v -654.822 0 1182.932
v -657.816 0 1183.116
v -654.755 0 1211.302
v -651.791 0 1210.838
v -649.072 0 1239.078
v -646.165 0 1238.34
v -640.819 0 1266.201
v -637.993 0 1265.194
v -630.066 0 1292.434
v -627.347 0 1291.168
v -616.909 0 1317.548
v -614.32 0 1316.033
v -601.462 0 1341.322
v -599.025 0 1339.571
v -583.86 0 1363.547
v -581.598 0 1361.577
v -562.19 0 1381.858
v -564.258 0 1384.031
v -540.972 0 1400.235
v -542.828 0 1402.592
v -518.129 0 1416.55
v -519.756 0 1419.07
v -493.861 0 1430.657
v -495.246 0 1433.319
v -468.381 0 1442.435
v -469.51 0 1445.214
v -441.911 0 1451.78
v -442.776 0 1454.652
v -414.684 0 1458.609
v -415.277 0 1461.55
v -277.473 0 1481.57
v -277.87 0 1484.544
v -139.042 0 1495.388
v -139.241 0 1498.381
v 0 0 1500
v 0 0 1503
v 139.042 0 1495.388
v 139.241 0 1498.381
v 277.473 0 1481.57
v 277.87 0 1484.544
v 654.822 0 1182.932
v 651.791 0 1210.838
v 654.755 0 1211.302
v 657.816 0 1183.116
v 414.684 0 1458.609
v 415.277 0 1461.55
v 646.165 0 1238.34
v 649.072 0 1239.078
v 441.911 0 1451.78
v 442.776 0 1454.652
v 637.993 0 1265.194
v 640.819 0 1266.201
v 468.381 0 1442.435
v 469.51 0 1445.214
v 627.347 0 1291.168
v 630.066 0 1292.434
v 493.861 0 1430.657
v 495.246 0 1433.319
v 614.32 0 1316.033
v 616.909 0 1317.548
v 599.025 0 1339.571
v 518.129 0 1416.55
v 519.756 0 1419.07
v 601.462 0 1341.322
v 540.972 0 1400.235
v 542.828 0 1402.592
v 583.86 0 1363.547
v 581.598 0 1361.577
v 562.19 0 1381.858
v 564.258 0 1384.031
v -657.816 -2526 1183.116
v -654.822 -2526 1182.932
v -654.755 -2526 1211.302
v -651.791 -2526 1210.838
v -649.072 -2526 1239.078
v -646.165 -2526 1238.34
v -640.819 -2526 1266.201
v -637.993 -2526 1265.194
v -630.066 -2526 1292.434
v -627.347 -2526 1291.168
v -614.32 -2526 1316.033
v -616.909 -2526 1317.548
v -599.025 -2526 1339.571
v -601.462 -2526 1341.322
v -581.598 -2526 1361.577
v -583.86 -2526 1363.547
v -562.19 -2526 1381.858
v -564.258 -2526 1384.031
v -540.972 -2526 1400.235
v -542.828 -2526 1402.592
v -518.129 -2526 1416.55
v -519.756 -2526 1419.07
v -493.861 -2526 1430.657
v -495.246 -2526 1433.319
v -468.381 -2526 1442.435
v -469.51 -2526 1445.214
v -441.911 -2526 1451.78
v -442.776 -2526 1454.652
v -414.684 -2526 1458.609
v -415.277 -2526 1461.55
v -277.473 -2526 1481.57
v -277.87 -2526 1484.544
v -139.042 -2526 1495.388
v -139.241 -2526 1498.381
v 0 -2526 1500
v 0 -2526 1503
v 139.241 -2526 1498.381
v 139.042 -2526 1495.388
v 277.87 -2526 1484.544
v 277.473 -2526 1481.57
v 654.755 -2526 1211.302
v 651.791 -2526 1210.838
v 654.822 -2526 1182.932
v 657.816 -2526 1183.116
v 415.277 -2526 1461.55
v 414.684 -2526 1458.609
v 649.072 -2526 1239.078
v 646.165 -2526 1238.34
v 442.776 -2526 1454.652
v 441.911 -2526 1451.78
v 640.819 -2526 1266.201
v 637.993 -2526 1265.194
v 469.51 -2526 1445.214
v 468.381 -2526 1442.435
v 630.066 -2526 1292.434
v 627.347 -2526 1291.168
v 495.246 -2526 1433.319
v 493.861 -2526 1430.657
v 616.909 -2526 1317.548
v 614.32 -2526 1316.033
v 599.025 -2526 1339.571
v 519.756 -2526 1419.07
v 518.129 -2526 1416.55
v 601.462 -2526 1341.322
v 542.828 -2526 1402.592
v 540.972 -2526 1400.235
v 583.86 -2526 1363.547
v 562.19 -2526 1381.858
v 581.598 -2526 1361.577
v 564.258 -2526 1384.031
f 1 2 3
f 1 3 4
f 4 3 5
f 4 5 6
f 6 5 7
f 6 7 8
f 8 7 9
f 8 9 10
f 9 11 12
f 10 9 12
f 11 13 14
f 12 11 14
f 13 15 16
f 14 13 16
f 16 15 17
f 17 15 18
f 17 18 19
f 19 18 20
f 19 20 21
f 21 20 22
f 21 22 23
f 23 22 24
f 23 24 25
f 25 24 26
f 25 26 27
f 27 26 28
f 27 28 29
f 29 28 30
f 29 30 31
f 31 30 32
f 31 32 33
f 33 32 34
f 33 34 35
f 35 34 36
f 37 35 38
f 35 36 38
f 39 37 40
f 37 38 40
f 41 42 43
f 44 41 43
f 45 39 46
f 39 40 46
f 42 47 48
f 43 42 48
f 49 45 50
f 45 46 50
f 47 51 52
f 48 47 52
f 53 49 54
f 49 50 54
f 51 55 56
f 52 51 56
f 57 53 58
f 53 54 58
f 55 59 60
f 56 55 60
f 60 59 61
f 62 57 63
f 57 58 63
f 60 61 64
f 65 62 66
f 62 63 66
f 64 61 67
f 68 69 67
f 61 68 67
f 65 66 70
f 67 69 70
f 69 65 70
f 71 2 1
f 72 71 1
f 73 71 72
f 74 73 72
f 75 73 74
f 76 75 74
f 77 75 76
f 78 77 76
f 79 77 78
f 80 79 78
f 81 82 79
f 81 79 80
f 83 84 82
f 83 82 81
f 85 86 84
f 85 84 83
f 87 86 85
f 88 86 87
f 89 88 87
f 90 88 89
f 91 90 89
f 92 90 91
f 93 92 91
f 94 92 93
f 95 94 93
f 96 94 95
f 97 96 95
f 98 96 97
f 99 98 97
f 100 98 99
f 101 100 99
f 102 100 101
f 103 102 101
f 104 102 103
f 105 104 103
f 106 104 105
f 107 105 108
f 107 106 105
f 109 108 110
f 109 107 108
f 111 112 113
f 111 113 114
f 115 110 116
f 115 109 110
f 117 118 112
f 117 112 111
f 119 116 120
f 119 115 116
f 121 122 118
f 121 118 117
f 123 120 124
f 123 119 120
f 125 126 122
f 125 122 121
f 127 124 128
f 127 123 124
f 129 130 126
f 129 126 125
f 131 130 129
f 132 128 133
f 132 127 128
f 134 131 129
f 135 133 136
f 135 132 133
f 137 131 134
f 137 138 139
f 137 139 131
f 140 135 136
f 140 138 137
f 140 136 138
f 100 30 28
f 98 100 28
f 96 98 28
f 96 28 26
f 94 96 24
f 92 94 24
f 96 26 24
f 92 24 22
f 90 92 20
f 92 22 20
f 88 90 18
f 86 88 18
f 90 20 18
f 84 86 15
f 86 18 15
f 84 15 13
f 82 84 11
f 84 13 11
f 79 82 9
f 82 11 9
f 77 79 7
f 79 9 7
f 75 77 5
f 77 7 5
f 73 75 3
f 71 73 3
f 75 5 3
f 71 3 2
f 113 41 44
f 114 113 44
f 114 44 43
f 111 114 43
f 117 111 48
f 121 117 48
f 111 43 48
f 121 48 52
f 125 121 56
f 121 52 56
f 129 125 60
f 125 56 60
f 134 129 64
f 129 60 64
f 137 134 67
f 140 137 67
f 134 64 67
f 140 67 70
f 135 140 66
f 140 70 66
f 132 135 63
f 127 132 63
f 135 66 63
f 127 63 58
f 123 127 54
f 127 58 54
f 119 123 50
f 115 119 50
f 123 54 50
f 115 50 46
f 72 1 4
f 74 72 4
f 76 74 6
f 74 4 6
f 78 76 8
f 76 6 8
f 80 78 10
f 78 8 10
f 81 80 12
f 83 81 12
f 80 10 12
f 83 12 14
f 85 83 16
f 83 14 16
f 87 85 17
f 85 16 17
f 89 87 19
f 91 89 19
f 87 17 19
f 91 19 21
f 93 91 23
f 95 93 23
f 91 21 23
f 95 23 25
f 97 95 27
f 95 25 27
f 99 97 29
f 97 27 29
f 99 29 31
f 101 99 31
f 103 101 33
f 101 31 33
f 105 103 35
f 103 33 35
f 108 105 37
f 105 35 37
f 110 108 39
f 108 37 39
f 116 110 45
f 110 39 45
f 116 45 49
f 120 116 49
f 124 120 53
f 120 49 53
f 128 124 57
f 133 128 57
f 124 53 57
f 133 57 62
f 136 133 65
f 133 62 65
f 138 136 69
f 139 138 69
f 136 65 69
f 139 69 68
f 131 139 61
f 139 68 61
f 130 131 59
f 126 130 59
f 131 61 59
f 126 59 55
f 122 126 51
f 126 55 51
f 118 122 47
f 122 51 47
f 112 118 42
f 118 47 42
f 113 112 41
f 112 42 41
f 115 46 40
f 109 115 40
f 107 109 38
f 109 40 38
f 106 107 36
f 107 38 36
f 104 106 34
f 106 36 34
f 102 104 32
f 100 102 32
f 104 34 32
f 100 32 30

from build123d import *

# Parameters (mm, degrees)
F1_DEPTH = 2526


with BuildPart() as f1:
    # F0 (on Front) → F1 (new body)
    with BuildSketch(Plane.XZ):
        with BuildLine():
            ThreePointArc((-414.6836784295, 1458.609211018), (0, 1500), (414.6836784295, 1458.609211018))
            ThreePointArc((414.6836784295, 1458.609211018), (581.5981876067, 1361.576932454), (654.8216297668, 1182.9319102019))
            Line((654.8216297668, 1182.9319102019), (657.8159792684, 1183.1159511275))
            ThreePointArc((657.8159792684, 1183.1159511275), (583.8603026867, 1363.5474236021), (415.2766484177, 1461.5500249518))
            ThreePointArc((415.2766484177, 1461.5500249518), (0, 1503), (-415.2766484177, 1461.5500249518))
            ThreePointArc((-415.2766484177, 1461.5500249518), (-583.8603026867, 1363.5474236021), (-657.8159792684, 1183.1159511275))
            Line((-657.8159792684, 1183.1159511275), (-654.8216297668, 1182.9319102019))
            ThreePointArc((-654.8216297668, 1182.9319102019), (-581.5981876067, 1361.576932454), (-414.6836784295, 1458.609211018))
        make_face()
    extrude(amount=F1_DEPTH)


solid = f1.part
